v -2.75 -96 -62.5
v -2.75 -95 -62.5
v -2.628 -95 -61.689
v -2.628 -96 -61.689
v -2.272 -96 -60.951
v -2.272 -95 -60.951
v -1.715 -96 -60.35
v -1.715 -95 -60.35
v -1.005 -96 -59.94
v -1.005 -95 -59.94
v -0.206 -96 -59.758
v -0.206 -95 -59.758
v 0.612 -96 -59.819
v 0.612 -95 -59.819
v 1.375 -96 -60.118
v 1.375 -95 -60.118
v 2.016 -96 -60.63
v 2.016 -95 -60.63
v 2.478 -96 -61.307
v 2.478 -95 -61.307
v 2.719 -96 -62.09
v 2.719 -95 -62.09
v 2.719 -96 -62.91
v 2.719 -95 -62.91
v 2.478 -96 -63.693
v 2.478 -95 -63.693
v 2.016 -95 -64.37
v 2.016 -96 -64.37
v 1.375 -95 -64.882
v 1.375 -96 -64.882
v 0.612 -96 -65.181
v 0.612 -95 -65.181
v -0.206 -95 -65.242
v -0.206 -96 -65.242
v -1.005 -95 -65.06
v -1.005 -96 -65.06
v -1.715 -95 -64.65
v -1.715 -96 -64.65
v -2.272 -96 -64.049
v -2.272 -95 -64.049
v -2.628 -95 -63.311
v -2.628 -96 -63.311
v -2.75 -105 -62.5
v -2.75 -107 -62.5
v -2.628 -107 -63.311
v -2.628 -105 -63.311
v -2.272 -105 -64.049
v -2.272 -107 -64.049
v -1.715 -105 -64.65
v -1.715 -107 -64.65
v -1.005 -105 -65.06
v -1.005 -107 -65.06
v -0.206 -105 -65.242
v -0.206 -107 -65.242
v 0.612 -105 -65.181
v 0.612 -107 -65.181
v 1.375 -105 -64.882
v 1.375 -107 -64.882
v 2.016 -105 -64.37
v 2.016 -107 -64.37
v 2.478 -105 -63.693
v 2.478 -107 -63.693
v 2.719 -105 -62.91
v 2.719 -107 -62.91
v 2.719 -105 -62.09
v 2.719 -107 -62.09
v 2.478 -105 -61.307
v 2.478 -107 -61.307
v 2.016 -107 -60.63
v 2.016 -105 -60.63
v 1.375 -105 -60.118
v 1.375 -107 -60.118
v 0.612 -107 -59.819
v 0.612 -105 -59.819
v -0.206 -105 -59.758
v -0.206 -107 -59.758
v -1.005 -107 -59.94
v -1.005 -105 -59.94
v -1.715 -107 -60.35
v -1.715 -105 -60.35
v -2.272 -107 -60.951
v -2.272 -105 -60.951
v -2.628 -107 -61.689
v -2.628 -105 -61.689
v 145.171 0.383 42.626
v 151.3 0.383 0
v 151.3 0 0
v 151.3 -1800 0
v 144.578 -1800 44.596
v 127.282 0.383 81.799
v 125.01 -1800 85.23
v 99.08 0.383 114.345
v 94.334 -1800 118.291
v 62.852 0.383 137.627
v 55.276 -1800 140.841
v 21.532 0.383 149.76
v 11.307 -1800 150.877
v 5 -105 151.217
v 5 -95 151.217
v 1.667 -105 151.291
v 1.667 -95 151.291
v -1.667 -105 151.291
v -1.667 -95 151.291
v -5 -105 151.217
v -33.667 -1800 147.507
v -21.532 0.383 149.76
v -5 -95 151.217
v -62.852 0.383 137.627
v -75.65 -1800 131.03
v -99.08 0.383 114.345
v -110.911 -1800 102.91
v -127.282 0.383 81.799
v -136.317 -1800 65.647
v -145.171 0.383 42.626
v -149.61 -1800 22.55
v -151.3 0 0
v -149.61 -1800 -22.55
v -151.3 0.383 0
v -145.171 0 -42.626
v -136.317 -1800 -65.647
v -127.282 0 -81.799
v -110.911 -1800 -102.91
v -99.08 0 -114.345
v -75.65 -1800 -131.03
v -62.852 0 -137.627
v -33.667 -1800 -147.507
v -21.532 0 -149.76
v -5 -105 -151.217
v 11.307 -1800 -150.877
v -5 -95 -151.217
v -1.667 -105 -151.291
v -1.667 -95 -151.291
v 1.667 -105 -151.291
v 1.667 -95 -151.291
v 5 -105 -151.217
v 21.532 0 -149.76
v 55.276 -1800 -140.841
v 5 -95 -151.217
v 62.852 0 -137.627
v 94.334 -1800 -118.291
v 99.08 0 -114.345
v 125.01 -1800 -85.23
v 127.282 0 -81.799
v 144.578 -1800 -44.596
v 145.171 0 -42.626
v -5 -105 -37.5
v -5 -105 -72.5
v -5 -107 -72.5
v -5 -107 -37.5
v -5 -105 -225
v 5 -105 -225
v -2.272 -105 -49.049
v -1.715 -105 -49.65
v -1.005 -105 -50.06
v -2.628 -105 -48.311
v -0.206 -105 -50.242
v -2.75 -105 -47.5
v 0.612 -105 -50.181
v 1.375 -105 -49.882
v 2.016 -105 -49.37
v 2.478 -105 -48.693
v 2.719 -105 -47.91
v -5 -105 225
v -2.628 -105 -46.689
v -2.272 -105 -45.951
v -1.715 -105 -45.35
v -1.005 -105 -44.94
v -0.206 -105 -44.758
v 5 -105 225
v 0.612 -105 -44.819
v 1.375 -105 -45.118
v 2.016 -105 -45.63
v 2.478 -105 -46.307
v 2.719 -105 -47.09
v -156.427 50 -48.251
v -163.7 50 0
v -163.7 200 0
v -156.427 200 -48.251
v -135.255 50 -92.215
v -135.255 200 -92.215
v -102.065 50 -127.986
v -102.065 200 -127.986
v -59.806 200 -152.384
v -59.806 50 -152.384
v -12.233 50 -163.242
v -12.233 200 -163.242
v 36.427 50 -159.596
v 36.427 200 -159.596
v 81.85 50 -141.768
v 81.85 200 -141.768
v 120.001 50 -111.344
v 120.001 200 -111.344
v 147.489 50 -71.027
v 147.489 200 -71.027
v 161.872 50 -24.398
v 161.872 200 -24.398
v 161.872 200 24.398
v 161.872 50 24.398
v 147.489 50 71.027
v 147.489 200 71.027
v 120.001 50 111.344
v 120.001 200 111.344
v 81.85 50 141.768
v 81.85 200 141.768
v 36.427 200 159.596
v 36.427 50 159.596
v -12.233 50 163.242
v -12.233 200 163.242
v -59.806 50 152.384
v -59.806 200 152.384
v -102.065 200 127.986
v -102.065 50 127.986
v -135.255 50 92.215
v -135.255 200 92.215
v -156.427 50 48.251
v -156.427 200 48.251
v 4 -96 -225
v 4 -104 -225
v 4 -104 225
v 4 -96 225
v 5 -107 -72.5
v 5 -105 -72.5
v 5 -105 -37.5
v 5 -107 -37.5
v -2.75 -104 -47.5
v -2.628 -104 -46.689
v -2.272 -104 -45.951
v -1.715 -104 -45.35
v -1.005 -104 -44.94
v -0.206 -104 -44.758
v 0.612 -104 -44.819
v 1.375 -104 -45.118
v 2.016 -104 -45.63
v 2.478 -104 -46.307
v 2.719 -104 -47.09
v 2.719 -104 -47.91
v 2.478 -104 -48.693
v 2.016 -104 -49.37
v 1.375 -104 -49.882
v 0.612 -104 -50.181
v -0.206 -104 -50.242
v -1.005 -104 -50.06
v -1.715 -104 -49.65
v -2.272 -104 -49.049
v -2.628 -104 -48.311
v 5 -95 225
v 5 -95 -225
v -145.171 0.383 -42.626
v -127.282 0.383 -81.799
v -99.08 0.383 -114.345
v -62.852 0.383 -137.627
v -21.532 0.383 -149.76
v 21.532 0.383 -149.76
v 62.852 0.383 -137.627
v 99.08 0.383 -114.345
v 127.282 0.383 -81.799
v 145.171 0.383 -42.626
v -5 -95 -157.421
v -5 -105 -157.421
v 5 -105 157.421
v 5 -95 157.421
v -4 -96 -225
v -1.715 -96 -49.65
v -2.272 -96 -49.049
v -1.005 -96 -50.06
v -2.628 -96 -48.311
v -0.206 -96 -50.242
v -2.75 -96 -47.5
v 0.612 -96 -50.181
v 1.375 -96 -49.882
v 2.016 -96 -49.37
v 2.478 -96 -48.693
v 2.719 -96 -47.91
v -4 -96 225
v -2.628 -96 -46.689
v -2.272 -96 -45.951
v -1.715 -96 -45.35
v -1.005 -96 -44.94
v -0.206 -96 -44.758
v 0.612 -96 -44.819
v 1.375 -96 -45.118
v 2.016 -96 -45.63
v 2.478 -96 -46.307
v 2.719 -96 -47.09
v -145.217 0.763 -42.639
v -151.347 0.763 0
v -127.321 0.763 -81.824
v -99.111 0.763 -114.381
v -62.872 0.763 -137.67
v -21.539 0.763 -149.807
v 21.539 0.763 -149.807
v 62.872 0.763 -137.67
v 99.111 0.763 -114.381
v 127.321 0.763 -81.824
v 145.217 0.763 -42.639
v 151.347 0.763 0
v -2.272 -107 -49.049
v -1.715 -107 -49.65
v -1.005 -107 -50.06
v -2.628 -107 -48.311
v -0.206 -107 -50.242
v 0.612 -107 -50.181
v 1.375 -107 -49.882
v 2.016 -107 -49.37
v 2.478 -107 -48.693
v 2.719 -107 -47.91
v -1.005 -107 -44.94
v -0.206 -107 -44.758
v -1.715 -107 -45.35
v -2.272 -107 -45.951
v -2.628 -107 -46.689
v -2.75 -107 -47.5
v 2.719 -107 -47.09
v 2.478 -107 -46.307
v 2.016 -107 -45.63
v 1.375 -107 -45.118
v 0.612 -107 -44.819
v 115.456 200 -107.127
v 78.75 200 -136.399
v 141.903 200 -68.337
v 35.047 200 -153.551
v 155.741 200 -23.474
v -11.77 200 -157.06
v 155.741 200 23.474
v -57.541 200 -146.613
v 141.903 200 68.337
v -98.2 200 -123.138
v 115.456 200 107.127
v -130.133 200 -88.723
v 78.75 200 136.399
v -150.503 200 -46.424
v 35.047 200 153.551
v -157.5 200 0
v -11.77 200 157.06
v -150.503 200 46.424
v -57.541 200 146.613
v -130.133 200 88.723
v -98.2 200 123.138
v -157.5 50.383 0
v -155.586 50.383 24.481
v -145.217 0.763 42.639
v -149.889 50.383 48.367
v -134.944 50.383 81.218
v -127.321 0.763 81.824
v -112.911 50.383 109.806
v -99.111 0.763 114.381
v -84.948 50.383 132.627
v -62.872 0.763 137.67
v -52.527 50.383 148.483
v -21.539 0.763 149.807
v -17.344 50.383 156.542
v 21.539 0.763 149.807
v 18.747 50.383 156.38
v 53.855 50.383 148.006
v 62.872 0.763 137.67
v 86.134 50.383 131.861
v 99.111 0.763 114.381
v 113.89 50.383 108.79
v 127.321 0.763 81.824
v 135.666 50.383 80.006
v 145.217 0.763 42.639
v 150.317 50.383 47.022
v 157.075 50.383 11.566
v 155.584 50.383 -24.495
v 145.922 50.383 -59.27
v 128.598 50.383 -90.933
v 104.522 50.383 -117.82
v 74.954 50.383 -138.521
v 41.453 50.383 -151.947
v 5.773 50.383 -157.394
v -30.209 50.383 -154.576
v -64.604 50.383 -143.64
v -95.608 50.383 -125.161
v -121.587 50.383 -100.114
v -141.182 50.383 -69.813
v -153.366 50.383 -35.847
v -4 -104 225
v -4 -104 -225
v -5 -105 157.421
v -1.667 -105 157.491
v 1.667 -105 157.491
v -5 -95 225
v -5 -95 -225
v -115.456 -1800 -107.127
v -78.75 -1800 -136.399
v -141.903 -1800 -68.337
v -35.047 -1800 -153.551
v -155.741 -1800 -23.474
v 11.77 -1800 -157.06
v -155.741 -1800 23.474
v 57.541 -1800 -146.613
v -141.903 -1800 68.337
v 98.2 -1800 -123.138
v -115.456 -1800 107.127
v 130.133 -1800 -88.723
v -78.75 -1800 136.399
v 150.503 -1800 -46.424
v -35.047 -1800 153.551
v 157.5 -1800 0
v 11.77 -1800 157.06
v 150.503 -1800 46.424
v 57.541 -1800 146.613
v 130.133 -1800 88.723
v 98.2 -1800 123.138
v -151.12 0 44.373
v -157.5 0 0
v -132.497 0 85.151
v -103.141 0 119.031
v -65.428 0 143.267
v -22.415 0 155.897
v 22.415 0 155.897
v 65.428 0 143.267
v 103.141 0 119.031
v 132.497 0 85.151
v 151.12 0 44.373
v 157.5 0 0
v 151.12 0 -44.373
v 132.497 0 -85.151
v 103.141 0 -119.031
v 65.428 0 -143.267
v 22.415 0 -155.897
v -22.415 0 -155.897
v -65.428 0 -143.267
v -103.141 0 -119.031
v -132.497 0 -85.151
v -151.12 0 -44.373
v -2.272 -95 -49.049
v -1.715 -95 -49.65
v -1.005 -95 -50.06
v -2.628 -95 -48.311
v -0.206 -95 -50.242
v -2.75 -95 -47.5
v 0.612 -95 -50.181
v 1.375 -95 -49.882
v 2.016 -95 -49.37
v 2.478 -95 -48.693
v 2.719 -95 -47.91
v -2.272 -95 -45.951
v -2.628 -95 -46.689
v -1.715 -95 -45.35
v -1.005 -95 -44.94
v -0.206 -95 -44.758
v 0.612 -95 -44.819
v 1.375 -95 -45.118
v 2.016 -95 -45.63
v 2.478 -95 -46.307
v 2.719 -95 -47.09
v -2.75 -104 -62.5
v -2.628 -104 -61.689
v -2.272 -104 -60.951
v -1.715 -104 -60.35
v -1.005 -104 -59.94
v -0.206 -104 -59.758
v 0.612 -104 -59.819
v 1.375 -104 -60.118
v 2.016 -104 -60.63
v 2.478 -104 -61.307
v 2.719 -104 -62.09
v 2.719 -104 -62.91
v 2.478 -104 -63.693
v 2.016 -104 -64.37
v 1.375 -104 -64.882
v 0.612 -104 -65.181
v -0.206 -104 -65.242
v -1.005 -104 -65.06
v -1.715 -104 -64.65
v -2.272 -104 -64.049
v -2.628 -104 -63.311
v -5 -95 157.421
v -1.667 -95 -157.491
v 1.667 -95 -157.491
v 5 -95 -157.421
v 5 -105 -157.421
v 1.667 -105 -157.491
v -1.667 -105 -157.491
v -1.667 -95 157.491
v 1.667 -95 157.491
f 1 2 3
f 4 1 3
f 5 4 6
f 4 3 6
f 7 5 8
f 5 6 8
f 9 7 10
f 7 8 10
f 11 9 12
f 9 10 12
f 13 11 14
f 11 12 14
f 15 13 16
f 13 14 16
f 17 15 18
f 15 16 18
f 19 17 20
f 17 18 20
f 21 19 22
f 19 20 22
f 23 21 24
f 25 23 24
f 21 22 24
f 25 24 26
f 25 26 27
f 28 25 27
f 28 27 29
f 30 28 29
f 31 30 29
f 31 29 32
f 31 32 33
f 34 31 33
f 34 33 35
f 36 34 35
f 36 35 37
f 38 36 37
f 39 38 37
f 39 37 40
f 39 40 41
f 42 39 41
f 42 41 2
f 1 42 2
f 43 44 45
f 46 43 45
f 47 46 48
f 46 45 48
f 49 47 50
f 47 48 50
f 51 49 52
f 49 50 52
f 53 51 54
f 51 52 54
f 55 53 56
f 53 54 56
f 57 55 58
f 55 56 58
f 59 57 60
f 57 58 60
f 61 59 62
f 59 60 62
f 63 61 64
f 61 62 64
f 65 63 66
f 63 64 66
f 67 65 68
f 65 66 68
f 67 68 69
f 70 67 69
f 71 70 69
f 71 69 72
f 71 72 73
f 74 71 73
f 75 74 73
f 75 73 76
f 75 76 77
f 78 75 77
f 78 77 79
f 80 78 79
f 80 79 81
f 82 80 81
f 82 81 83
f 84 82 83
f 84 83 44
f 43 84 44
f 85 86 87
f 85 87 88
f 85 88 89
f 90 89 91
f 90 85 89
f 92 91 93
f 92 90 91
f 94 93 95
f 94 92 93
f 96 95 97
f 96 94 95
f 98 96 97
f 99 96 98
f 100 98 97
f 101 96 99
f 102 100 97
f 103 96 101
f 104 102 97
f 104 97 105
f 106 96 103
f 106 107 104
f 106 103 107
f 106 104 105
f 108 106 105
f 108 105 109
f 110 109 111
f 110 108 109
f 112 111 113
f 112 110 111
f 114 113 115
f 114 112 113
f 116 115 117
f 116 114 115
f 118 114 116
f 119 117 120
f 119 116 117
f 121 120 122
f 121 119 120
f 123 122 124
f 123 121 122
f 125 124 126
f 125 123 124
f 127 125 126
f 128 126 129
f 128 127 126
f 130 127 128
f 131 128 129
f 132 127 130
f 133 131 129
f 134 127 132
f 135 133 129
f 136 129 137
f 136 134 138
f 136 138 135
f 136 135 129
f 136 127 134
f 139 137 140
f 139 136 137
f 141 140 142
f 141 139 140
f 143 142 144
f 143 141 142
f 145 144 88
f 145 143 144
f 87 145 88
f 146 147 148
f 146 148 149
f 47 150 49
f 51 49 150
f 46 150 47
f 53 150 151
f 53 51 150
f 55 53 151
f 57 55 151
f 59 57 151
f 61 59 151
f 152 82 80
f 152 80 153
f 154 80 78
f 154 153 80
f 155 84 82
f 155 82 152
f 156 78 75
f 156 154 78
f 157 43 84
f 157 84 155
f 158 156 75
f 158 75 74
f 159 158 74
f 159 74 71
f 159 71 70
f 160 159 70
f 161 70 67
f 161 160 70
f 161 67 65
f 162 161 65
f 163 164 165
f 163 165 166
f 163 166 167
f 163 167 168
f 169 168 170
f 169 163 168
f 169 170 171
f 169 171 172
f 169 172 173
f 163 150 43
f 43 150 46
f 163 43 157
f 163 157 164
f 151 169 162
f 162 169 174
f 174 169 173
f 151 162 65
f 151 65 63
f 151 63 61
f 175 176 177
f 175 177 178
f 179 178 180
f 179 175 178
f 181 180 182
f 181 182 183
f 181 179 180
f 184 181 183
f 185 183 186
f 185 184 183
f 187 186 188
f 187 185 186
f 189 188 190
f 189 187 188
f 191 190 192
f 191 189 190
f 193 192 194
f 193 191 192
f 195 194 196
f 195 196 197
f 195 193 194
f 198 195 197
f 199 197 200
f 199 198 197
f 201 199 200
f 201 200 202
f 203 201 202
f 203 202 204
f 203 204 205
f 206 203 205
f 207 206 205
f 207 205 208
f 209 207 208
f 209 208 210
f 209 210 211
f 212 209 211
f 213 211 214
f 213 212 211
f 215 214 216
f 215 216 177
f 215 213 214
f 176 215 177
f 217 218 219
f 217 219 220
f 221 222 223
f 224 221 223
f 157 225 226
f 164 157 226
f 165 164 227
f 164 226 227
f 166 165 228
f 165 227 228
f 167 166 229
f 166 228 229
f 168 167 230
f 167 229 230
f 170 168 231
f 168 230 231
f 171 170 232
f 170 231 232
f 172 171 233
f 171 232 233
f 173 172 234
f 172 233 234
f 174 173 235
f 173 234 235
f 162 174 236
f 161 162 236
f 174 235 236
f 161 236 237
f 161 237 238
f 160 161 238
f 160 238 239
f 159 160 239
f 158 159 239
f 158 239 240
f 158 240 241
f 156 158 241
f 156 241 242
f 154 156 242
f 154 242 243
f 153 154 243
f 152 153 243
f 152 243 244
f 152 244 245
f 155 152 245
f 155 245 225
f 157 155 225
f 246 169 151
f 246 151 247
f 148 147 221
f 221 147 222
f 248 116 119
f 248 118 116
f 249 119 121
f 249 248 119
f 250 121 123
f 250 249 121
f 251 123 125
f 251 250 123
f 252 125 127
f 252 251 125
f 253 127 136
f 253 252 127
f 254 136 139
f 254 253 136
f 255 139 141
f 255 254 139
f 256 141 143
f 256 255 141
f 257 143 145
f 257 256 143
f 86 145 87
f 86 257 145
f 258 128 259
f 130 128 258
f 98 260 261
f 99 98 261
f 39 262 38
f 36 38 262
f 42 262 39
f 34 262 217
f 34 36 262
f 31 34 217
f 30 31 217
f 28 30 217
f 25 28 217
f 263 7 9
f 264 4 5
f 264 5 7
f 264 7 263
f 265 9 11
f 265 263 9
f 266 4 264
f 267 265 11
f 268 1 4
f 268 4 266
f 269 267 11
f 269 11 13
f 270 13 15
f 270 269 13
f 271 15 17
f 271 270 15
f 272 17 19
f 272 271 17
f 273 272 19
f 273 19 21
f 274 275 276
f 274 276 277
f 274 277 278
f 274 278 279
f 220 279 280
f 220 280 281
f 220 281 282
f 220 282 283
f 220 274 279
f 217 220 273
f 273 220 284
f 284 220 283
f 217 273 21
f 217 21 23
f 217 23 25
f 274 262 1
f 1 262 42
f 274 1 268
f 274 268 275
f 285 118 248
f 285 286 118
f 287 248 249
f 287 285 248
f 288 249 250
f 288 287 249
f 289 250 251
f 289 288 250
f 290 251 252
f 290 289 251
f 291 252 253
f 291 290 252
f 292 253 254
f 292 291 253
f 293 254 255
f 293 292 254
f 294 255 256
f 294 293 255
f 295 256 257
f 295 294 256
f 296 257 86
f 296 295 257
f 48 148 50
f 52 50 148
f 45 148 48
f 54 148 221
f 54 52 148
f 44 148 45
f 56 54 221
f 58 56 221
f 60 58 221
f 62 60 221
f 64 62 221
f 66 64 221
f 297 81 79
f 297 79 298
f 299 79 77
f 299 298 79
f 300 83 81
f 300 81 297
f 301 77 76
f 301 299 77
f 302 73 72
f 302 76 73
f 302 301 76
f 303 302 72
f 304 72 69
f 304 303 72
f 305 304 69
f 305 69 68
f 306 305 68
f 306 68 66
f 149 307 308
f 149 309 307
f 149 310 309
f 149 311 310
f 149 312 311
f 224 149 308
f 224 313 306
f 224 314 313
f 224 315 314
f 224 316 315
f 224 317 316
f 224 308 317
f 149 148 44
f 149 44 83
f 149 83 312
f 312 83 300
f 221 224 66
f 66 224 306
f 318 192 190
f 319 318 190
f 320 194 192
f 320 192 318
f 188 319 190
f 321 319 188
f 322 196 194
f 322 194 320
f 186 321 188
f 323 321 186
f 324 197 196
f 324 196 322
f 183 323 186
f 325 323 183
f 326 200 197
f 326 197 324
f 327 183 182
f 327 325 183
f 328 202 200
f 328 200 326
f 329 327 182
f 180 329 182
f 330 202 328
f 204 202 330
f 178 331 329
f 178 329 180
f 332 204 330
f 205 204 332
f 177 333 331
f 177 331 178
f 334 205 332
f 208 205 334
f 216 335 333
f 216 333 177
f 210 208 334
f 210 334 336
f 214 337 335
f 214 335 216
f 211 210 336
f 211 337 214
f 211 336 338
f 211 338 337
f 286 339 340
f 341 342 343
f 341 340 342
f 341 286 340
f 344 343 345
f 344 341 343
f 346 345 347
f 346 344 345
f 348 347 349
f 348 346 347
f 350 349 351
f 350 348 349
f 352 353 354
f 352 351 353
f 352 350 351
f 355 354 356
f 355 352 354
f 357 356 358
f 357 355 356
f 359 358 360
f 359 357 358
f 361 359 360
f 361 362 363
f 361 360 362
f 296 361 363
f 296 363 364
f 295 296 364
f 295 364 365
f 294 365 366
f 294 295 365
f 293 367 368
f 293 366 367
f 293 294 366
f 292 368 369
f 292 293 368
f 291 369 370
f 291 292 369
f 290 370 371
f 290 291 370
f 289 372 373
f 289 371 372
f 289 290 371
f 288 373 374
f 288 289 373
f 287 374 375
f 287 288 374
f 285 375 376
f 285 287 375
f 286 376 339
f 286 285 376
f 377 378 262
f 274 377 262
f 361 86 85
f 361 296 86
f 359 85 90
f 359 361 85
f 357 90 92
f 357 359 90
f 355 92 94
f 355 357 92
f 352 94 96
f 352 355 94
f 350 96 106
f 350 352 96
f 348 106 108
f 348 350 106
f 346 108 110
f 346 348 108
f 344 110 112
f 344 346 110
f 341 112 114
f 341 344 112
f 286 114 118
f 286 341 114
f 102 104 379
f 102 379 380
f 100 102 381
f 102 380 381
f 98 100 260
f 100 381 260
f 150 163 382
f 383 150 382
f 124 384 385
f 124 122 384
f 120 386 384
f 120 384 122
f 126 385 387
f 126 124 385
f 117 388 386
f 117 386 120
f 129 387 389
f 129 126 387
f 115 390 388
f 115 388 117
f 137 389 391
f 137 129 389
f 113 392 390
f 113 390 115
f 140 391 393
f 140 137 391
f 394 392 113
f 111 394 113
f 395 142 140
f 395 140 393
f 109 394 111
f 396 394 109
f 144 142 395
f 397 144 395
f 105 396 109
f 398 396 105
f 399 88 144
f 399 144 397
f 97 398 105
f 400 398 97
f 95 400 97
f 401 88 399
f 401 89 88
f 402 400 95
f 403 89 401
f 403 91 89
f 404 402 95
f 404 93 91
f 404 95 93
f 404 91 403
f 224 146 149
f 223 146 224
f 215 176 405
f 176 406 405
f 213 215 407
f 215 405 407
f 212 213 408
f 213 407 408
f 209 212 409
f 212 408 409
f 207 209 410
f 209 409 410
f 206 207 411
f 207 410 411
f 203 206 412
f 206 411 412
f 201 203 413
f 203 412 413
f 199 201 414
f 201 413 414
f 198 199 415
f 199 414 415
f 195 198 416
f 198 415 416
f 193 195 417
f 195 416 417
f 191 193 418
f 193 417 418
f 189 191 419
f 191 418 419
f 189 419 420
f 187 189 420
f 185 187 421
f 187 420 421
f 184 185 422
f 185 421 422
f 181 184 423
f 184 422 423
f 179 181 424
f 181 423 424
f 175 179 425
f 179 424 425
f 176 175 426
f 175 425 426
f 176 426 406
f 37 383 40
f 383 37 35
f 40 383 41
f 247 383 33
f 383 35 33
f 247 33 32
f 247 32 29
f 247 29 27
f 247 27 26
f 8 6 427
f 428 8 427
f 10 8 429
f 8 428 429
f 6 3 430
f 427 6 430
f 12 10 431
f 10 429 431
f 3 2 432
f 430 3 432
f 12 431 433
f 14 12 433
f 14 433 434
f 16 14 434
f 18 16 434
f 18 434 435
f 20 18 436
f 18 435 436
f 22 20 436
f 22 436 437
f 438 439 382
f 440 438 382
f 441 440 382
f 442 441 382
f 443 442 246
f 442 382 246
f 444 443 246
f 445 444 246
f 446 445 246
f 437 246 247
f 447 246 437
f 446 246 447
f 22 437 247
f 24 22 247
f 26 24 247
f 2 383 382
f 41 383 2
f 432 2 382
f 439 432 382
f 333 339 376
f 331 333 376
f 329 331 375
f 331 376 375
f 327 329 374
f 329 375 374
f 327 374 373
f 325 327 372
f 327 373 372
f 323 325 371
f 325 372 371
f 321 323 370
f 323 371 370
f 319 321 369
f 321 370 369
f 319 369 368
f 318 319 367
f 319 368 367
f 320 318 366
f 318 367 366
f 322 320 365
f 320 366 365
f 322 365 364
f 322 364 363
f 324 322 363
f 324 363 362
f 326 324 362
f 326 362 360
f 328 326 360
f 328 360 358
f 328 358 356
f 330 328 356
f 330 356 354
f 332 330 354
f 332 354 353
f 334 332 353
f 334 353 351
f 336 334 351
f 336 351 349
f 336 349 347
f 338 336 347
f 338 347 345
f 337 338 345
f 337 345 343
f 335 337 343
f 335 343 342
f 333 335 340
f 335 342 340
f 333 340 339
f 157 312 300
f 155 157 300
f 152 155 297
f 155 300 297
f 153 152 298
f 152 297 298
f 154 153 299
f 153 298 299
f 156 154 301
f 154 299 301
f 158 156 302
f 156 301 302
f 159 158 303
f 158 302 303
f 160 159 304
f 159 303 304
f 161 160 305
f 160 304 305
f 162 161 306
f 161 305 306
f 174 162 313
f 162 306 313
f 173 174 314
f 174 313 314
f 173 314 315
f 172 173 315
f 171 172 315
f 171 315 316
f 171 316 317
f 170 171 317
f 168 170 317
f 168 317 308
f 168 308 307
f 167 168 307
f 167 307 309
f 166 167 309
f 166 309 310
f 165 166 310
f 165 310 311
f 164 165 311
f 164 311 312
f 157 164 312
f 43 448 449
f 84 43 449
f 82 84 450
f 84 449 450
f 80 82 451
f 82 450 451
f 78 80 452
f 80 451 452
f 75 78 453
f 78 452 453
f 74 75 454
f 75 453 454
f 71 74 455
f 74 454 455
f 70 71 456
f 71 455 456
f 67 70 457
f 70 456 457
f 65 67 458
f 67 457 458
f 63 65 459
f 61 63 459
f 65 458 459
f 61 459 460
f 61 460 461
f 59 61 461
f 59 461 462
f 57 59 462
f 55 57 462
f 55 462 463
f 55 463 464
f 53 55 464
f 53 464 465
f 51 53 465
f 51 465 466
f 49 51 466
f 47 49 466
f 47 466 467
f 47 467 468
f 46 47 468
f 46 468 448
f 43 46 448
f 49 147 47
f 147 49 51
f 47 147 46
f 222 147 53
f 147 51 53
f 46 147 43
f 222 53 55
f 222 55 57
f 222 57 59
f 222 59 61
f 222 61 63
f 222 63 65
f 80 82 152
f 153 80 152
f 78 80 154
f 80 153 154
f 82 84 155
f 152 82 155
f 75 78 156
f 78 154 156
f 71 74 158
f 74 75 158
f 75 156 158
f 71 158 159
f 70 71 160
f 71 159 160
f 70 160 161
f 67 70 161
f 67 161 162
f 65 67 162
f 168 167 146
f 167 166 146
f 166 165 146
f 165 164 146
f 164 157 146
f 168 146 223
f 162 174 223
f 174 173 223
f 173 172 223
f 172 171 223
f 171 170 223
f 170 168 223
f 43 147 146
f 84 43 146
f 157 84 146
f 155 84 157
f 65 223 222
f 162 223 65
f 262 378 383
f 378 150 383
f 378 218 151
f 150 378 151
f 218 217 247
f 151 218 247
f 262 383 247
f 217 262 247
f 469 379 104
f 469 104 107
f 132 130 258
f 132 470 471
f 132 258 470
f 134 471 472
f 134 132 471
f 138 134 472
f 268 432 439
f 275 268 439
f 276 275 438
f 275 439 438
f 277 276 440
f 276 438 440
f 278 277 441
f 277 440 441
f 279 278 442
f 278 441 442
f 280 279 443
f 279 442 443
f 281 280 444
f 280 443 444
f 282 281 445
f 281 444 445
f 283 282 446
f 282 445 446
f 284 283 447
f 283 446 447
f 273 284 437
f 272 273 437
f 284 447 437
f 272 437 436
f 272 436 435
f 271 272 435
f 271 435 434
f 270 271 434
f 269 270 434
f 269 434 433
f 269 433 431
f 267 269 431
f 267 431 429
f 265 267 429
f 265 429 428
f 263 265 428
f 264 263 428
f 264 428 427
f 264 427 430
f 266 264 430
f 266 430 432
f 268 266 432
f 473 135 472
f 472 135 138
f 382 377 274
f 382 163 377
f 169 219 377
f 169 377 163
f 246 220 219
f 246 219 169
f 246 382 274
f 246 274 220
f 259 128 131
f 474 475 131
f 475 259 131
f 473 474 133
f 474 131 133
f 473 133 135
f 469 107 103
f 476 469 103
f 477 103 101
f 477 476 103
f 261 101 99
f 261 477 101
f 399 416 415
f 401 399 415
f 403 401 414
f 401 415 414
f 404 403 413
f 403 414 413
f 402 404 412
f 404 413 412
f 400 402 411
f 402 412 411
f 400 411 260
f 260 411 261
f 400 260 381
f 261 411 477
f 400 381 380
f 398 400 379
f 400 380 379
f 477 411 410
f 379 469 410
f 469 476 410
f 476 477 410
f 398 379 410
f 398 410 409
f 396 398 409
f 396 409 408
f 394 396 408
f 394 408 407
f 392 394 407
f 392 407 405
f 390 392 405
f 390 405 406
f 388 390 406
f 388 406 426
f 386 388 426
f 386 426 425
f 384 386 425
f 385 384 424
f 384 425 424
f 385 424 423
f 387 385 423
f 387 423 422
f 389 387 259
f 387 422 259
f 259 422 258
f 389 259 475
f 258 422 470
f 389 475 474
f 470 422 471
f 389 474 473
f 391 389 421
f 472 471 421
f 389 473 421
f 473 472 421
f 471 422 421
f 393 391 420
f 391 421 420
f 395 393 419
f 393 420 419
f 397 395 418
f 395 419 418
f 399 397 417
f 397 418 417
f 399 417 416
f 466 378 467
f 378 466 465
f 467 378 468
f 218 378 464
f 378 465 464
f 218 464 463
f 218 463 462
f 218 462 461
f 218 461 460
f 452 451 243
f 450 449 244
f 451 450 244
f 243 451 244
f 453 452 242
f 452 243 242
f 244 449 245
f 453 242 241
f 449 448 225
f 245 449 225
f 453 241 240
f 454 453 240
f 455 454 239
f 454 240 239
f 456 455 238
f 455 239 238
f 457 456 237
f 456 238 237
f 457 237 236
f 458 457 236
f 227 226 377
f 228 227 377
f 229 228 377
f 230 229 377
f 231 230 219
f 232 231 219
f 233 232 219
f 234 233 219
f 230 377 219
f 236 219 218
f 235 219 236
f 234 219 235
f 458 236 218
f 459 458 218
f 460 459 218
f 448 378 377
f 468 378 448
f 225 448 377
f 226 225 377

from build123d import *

# Parameters (mm, degrees)
F0_R        = 157.5
F1_DEPTH    = 1800
F3_R        = 163.7
F1_FACE_R   = 157.5
F5_DEPTH    = 150
F6_T        = 6.2
F6_T4_ANGLE = 180.000000001
F6_T6_ANGLE = 180.000000001
F7_W        = 10
F7_H        = 10
F8_DEPTH    = 350
F9_DEPTH    = 225
F10_T       = -1
F11_W       = 10
F11_H       = 35
F12_DEPTH   = 2
F13_D       = 5.5
F14_D       = 5.5


# Not quite as in the source:
# - a shell that OpenCascade refuses in one call is made with other operations: the cavity is built on its own and cut out
# - a feature names something its author has since deleted; it is built from what else it names


with BuildPart() as f1:
    # F0 (on Front) → F1 (new body)
    with BuildSketch(Plane.XZ):
        Circle(F0_R)
    extrude(amount=F1_DEPTH)

    # F3 (on offset) → F4 section 0
    with BuildSketch(Plane(origin=(0, 50, 0), x_dir=(-1, 0, 0), z_dir=(0, 1, 0))):
        Circle(F3_R)
    # F1_face (on face) → F4 section 1
    with BuildSketch(Plane(origin=(0, 0, 0), x_dir=(1, 0, 0), z_dir=(0, 1, 0))):
        Circle(F1_FACE_R)
    loft()

    # F5 (add): a face of the model
    f5_faces = [f1.faces().sort_by_distance(p)[0] for p in [
        (0, 50, 0),
    ]]
    extrude(f5_faces, amount=F5_DEPTH)

    # F6: shell of thickness 6.2, made by hand


with BuildPart() as f6_core1:
    # F6_t2: copy of F1
    add(f1.part)

    # the walls: a layer under each face that stays
    f6_faces = [f6_core1.faces().sort_by_distance(p)[0] for p in [
        (-157.5, -900, 0),
        (160.6, 25, 0),
        (163.7, 125, 0),
    ]]
    thicken(f6_faces, amount=-F6_T, mode=Mode.SUBTRACT)

    # F6_s3 → F6_t4 (revolve, cut)
    with BuildSketch(Plane.XY):
        Polygon((157.6235287713, -0.0076295676), (151.3, 0), (151.3, 0.3829336184), (151.3471228701, 0.7629567641), align=None)
    revolve(axis=Axis((0, 0, 0), (0, -1, 0)), revolution_arc=F6_T4_ANGLE, mode=Mode.SUBTRACT)

    # F6_s5 → F6_t6 (revolve, cut)
    with BuildSketch(Plane.XY):
        Polygon((-157.6235287713, -0.0076295676), (-151.3, 0), (-151.3, 0.3829336184), (-151.3471228701, 0.7629567641), align=None)
    revolve(axis=Axis((0, 0, 0), (0, -1, 0)), revolution_arc=F6_T6_ANGLE, mode=Mode.SUBTRACT)


with BuildPart() as f1_1:
    add(f1.part)

    # what is left inside the walls is the cavity
    f6_cavity = [f6_core1.part.solids().sort_by_distance(p)[0] for p in [
        (-151.238, -1199.872355, 0),
    ]]
    add(f6_cavity, mode=Mode.SUBTRACT)

    # F7 (on Top) → F8 (cut, symmetric)
    with BuildSketch(Plane.XY):
        with Locations((0, -100)):
            Rectangle(F7_W, F7_H)
    extrude(amount=F8_DEPTH, both=True, mode=Mode.SUBTRACT)


with BuildPart() as f9:
    # F7 (on Top) → F9 (new body, symmetric)
    with BuildSketch(Plane.XY):
        with Locations((0, -100)):
            Rectangle(F7_W, F7_H)
    extrude(amount=F9_DEPTH, both=True)

    # F10
    f10_openings = [f9.faces().sort_by_distance(p)[0] for p in [
        (0, -100, 225),
        (0, -100, -225),
    ]]
    offset(amount=F10_T, openings=f10_openings)

    # F13 (through all)
    with Locations(Plane.XZ.offset(105)):
        with Locations((0, -47.5), (0, -62.5)):
            Hole(F13_D / 2)


with BuildPart() as f12:
    # F11 (on face) → F12 (new body)
    with BuildSketch(Plane.XZ.offset(105)):
        with Locations((0, -55)):
            Rectangle(F11_W, F11_H)
    extrude(amount=F12_DEPTH)

    # F14 (through all)
    with Locations(Plane(origin=(0, -105, 0), x_dir=(1, 0, 0), z_dir=(0, 1, 0))):
        with Locations((0, 47.5), (0, 62.5)):
            Hole(F14_D / 2)


solid = Compound([f1_1.part, f9.part, f12.part])
